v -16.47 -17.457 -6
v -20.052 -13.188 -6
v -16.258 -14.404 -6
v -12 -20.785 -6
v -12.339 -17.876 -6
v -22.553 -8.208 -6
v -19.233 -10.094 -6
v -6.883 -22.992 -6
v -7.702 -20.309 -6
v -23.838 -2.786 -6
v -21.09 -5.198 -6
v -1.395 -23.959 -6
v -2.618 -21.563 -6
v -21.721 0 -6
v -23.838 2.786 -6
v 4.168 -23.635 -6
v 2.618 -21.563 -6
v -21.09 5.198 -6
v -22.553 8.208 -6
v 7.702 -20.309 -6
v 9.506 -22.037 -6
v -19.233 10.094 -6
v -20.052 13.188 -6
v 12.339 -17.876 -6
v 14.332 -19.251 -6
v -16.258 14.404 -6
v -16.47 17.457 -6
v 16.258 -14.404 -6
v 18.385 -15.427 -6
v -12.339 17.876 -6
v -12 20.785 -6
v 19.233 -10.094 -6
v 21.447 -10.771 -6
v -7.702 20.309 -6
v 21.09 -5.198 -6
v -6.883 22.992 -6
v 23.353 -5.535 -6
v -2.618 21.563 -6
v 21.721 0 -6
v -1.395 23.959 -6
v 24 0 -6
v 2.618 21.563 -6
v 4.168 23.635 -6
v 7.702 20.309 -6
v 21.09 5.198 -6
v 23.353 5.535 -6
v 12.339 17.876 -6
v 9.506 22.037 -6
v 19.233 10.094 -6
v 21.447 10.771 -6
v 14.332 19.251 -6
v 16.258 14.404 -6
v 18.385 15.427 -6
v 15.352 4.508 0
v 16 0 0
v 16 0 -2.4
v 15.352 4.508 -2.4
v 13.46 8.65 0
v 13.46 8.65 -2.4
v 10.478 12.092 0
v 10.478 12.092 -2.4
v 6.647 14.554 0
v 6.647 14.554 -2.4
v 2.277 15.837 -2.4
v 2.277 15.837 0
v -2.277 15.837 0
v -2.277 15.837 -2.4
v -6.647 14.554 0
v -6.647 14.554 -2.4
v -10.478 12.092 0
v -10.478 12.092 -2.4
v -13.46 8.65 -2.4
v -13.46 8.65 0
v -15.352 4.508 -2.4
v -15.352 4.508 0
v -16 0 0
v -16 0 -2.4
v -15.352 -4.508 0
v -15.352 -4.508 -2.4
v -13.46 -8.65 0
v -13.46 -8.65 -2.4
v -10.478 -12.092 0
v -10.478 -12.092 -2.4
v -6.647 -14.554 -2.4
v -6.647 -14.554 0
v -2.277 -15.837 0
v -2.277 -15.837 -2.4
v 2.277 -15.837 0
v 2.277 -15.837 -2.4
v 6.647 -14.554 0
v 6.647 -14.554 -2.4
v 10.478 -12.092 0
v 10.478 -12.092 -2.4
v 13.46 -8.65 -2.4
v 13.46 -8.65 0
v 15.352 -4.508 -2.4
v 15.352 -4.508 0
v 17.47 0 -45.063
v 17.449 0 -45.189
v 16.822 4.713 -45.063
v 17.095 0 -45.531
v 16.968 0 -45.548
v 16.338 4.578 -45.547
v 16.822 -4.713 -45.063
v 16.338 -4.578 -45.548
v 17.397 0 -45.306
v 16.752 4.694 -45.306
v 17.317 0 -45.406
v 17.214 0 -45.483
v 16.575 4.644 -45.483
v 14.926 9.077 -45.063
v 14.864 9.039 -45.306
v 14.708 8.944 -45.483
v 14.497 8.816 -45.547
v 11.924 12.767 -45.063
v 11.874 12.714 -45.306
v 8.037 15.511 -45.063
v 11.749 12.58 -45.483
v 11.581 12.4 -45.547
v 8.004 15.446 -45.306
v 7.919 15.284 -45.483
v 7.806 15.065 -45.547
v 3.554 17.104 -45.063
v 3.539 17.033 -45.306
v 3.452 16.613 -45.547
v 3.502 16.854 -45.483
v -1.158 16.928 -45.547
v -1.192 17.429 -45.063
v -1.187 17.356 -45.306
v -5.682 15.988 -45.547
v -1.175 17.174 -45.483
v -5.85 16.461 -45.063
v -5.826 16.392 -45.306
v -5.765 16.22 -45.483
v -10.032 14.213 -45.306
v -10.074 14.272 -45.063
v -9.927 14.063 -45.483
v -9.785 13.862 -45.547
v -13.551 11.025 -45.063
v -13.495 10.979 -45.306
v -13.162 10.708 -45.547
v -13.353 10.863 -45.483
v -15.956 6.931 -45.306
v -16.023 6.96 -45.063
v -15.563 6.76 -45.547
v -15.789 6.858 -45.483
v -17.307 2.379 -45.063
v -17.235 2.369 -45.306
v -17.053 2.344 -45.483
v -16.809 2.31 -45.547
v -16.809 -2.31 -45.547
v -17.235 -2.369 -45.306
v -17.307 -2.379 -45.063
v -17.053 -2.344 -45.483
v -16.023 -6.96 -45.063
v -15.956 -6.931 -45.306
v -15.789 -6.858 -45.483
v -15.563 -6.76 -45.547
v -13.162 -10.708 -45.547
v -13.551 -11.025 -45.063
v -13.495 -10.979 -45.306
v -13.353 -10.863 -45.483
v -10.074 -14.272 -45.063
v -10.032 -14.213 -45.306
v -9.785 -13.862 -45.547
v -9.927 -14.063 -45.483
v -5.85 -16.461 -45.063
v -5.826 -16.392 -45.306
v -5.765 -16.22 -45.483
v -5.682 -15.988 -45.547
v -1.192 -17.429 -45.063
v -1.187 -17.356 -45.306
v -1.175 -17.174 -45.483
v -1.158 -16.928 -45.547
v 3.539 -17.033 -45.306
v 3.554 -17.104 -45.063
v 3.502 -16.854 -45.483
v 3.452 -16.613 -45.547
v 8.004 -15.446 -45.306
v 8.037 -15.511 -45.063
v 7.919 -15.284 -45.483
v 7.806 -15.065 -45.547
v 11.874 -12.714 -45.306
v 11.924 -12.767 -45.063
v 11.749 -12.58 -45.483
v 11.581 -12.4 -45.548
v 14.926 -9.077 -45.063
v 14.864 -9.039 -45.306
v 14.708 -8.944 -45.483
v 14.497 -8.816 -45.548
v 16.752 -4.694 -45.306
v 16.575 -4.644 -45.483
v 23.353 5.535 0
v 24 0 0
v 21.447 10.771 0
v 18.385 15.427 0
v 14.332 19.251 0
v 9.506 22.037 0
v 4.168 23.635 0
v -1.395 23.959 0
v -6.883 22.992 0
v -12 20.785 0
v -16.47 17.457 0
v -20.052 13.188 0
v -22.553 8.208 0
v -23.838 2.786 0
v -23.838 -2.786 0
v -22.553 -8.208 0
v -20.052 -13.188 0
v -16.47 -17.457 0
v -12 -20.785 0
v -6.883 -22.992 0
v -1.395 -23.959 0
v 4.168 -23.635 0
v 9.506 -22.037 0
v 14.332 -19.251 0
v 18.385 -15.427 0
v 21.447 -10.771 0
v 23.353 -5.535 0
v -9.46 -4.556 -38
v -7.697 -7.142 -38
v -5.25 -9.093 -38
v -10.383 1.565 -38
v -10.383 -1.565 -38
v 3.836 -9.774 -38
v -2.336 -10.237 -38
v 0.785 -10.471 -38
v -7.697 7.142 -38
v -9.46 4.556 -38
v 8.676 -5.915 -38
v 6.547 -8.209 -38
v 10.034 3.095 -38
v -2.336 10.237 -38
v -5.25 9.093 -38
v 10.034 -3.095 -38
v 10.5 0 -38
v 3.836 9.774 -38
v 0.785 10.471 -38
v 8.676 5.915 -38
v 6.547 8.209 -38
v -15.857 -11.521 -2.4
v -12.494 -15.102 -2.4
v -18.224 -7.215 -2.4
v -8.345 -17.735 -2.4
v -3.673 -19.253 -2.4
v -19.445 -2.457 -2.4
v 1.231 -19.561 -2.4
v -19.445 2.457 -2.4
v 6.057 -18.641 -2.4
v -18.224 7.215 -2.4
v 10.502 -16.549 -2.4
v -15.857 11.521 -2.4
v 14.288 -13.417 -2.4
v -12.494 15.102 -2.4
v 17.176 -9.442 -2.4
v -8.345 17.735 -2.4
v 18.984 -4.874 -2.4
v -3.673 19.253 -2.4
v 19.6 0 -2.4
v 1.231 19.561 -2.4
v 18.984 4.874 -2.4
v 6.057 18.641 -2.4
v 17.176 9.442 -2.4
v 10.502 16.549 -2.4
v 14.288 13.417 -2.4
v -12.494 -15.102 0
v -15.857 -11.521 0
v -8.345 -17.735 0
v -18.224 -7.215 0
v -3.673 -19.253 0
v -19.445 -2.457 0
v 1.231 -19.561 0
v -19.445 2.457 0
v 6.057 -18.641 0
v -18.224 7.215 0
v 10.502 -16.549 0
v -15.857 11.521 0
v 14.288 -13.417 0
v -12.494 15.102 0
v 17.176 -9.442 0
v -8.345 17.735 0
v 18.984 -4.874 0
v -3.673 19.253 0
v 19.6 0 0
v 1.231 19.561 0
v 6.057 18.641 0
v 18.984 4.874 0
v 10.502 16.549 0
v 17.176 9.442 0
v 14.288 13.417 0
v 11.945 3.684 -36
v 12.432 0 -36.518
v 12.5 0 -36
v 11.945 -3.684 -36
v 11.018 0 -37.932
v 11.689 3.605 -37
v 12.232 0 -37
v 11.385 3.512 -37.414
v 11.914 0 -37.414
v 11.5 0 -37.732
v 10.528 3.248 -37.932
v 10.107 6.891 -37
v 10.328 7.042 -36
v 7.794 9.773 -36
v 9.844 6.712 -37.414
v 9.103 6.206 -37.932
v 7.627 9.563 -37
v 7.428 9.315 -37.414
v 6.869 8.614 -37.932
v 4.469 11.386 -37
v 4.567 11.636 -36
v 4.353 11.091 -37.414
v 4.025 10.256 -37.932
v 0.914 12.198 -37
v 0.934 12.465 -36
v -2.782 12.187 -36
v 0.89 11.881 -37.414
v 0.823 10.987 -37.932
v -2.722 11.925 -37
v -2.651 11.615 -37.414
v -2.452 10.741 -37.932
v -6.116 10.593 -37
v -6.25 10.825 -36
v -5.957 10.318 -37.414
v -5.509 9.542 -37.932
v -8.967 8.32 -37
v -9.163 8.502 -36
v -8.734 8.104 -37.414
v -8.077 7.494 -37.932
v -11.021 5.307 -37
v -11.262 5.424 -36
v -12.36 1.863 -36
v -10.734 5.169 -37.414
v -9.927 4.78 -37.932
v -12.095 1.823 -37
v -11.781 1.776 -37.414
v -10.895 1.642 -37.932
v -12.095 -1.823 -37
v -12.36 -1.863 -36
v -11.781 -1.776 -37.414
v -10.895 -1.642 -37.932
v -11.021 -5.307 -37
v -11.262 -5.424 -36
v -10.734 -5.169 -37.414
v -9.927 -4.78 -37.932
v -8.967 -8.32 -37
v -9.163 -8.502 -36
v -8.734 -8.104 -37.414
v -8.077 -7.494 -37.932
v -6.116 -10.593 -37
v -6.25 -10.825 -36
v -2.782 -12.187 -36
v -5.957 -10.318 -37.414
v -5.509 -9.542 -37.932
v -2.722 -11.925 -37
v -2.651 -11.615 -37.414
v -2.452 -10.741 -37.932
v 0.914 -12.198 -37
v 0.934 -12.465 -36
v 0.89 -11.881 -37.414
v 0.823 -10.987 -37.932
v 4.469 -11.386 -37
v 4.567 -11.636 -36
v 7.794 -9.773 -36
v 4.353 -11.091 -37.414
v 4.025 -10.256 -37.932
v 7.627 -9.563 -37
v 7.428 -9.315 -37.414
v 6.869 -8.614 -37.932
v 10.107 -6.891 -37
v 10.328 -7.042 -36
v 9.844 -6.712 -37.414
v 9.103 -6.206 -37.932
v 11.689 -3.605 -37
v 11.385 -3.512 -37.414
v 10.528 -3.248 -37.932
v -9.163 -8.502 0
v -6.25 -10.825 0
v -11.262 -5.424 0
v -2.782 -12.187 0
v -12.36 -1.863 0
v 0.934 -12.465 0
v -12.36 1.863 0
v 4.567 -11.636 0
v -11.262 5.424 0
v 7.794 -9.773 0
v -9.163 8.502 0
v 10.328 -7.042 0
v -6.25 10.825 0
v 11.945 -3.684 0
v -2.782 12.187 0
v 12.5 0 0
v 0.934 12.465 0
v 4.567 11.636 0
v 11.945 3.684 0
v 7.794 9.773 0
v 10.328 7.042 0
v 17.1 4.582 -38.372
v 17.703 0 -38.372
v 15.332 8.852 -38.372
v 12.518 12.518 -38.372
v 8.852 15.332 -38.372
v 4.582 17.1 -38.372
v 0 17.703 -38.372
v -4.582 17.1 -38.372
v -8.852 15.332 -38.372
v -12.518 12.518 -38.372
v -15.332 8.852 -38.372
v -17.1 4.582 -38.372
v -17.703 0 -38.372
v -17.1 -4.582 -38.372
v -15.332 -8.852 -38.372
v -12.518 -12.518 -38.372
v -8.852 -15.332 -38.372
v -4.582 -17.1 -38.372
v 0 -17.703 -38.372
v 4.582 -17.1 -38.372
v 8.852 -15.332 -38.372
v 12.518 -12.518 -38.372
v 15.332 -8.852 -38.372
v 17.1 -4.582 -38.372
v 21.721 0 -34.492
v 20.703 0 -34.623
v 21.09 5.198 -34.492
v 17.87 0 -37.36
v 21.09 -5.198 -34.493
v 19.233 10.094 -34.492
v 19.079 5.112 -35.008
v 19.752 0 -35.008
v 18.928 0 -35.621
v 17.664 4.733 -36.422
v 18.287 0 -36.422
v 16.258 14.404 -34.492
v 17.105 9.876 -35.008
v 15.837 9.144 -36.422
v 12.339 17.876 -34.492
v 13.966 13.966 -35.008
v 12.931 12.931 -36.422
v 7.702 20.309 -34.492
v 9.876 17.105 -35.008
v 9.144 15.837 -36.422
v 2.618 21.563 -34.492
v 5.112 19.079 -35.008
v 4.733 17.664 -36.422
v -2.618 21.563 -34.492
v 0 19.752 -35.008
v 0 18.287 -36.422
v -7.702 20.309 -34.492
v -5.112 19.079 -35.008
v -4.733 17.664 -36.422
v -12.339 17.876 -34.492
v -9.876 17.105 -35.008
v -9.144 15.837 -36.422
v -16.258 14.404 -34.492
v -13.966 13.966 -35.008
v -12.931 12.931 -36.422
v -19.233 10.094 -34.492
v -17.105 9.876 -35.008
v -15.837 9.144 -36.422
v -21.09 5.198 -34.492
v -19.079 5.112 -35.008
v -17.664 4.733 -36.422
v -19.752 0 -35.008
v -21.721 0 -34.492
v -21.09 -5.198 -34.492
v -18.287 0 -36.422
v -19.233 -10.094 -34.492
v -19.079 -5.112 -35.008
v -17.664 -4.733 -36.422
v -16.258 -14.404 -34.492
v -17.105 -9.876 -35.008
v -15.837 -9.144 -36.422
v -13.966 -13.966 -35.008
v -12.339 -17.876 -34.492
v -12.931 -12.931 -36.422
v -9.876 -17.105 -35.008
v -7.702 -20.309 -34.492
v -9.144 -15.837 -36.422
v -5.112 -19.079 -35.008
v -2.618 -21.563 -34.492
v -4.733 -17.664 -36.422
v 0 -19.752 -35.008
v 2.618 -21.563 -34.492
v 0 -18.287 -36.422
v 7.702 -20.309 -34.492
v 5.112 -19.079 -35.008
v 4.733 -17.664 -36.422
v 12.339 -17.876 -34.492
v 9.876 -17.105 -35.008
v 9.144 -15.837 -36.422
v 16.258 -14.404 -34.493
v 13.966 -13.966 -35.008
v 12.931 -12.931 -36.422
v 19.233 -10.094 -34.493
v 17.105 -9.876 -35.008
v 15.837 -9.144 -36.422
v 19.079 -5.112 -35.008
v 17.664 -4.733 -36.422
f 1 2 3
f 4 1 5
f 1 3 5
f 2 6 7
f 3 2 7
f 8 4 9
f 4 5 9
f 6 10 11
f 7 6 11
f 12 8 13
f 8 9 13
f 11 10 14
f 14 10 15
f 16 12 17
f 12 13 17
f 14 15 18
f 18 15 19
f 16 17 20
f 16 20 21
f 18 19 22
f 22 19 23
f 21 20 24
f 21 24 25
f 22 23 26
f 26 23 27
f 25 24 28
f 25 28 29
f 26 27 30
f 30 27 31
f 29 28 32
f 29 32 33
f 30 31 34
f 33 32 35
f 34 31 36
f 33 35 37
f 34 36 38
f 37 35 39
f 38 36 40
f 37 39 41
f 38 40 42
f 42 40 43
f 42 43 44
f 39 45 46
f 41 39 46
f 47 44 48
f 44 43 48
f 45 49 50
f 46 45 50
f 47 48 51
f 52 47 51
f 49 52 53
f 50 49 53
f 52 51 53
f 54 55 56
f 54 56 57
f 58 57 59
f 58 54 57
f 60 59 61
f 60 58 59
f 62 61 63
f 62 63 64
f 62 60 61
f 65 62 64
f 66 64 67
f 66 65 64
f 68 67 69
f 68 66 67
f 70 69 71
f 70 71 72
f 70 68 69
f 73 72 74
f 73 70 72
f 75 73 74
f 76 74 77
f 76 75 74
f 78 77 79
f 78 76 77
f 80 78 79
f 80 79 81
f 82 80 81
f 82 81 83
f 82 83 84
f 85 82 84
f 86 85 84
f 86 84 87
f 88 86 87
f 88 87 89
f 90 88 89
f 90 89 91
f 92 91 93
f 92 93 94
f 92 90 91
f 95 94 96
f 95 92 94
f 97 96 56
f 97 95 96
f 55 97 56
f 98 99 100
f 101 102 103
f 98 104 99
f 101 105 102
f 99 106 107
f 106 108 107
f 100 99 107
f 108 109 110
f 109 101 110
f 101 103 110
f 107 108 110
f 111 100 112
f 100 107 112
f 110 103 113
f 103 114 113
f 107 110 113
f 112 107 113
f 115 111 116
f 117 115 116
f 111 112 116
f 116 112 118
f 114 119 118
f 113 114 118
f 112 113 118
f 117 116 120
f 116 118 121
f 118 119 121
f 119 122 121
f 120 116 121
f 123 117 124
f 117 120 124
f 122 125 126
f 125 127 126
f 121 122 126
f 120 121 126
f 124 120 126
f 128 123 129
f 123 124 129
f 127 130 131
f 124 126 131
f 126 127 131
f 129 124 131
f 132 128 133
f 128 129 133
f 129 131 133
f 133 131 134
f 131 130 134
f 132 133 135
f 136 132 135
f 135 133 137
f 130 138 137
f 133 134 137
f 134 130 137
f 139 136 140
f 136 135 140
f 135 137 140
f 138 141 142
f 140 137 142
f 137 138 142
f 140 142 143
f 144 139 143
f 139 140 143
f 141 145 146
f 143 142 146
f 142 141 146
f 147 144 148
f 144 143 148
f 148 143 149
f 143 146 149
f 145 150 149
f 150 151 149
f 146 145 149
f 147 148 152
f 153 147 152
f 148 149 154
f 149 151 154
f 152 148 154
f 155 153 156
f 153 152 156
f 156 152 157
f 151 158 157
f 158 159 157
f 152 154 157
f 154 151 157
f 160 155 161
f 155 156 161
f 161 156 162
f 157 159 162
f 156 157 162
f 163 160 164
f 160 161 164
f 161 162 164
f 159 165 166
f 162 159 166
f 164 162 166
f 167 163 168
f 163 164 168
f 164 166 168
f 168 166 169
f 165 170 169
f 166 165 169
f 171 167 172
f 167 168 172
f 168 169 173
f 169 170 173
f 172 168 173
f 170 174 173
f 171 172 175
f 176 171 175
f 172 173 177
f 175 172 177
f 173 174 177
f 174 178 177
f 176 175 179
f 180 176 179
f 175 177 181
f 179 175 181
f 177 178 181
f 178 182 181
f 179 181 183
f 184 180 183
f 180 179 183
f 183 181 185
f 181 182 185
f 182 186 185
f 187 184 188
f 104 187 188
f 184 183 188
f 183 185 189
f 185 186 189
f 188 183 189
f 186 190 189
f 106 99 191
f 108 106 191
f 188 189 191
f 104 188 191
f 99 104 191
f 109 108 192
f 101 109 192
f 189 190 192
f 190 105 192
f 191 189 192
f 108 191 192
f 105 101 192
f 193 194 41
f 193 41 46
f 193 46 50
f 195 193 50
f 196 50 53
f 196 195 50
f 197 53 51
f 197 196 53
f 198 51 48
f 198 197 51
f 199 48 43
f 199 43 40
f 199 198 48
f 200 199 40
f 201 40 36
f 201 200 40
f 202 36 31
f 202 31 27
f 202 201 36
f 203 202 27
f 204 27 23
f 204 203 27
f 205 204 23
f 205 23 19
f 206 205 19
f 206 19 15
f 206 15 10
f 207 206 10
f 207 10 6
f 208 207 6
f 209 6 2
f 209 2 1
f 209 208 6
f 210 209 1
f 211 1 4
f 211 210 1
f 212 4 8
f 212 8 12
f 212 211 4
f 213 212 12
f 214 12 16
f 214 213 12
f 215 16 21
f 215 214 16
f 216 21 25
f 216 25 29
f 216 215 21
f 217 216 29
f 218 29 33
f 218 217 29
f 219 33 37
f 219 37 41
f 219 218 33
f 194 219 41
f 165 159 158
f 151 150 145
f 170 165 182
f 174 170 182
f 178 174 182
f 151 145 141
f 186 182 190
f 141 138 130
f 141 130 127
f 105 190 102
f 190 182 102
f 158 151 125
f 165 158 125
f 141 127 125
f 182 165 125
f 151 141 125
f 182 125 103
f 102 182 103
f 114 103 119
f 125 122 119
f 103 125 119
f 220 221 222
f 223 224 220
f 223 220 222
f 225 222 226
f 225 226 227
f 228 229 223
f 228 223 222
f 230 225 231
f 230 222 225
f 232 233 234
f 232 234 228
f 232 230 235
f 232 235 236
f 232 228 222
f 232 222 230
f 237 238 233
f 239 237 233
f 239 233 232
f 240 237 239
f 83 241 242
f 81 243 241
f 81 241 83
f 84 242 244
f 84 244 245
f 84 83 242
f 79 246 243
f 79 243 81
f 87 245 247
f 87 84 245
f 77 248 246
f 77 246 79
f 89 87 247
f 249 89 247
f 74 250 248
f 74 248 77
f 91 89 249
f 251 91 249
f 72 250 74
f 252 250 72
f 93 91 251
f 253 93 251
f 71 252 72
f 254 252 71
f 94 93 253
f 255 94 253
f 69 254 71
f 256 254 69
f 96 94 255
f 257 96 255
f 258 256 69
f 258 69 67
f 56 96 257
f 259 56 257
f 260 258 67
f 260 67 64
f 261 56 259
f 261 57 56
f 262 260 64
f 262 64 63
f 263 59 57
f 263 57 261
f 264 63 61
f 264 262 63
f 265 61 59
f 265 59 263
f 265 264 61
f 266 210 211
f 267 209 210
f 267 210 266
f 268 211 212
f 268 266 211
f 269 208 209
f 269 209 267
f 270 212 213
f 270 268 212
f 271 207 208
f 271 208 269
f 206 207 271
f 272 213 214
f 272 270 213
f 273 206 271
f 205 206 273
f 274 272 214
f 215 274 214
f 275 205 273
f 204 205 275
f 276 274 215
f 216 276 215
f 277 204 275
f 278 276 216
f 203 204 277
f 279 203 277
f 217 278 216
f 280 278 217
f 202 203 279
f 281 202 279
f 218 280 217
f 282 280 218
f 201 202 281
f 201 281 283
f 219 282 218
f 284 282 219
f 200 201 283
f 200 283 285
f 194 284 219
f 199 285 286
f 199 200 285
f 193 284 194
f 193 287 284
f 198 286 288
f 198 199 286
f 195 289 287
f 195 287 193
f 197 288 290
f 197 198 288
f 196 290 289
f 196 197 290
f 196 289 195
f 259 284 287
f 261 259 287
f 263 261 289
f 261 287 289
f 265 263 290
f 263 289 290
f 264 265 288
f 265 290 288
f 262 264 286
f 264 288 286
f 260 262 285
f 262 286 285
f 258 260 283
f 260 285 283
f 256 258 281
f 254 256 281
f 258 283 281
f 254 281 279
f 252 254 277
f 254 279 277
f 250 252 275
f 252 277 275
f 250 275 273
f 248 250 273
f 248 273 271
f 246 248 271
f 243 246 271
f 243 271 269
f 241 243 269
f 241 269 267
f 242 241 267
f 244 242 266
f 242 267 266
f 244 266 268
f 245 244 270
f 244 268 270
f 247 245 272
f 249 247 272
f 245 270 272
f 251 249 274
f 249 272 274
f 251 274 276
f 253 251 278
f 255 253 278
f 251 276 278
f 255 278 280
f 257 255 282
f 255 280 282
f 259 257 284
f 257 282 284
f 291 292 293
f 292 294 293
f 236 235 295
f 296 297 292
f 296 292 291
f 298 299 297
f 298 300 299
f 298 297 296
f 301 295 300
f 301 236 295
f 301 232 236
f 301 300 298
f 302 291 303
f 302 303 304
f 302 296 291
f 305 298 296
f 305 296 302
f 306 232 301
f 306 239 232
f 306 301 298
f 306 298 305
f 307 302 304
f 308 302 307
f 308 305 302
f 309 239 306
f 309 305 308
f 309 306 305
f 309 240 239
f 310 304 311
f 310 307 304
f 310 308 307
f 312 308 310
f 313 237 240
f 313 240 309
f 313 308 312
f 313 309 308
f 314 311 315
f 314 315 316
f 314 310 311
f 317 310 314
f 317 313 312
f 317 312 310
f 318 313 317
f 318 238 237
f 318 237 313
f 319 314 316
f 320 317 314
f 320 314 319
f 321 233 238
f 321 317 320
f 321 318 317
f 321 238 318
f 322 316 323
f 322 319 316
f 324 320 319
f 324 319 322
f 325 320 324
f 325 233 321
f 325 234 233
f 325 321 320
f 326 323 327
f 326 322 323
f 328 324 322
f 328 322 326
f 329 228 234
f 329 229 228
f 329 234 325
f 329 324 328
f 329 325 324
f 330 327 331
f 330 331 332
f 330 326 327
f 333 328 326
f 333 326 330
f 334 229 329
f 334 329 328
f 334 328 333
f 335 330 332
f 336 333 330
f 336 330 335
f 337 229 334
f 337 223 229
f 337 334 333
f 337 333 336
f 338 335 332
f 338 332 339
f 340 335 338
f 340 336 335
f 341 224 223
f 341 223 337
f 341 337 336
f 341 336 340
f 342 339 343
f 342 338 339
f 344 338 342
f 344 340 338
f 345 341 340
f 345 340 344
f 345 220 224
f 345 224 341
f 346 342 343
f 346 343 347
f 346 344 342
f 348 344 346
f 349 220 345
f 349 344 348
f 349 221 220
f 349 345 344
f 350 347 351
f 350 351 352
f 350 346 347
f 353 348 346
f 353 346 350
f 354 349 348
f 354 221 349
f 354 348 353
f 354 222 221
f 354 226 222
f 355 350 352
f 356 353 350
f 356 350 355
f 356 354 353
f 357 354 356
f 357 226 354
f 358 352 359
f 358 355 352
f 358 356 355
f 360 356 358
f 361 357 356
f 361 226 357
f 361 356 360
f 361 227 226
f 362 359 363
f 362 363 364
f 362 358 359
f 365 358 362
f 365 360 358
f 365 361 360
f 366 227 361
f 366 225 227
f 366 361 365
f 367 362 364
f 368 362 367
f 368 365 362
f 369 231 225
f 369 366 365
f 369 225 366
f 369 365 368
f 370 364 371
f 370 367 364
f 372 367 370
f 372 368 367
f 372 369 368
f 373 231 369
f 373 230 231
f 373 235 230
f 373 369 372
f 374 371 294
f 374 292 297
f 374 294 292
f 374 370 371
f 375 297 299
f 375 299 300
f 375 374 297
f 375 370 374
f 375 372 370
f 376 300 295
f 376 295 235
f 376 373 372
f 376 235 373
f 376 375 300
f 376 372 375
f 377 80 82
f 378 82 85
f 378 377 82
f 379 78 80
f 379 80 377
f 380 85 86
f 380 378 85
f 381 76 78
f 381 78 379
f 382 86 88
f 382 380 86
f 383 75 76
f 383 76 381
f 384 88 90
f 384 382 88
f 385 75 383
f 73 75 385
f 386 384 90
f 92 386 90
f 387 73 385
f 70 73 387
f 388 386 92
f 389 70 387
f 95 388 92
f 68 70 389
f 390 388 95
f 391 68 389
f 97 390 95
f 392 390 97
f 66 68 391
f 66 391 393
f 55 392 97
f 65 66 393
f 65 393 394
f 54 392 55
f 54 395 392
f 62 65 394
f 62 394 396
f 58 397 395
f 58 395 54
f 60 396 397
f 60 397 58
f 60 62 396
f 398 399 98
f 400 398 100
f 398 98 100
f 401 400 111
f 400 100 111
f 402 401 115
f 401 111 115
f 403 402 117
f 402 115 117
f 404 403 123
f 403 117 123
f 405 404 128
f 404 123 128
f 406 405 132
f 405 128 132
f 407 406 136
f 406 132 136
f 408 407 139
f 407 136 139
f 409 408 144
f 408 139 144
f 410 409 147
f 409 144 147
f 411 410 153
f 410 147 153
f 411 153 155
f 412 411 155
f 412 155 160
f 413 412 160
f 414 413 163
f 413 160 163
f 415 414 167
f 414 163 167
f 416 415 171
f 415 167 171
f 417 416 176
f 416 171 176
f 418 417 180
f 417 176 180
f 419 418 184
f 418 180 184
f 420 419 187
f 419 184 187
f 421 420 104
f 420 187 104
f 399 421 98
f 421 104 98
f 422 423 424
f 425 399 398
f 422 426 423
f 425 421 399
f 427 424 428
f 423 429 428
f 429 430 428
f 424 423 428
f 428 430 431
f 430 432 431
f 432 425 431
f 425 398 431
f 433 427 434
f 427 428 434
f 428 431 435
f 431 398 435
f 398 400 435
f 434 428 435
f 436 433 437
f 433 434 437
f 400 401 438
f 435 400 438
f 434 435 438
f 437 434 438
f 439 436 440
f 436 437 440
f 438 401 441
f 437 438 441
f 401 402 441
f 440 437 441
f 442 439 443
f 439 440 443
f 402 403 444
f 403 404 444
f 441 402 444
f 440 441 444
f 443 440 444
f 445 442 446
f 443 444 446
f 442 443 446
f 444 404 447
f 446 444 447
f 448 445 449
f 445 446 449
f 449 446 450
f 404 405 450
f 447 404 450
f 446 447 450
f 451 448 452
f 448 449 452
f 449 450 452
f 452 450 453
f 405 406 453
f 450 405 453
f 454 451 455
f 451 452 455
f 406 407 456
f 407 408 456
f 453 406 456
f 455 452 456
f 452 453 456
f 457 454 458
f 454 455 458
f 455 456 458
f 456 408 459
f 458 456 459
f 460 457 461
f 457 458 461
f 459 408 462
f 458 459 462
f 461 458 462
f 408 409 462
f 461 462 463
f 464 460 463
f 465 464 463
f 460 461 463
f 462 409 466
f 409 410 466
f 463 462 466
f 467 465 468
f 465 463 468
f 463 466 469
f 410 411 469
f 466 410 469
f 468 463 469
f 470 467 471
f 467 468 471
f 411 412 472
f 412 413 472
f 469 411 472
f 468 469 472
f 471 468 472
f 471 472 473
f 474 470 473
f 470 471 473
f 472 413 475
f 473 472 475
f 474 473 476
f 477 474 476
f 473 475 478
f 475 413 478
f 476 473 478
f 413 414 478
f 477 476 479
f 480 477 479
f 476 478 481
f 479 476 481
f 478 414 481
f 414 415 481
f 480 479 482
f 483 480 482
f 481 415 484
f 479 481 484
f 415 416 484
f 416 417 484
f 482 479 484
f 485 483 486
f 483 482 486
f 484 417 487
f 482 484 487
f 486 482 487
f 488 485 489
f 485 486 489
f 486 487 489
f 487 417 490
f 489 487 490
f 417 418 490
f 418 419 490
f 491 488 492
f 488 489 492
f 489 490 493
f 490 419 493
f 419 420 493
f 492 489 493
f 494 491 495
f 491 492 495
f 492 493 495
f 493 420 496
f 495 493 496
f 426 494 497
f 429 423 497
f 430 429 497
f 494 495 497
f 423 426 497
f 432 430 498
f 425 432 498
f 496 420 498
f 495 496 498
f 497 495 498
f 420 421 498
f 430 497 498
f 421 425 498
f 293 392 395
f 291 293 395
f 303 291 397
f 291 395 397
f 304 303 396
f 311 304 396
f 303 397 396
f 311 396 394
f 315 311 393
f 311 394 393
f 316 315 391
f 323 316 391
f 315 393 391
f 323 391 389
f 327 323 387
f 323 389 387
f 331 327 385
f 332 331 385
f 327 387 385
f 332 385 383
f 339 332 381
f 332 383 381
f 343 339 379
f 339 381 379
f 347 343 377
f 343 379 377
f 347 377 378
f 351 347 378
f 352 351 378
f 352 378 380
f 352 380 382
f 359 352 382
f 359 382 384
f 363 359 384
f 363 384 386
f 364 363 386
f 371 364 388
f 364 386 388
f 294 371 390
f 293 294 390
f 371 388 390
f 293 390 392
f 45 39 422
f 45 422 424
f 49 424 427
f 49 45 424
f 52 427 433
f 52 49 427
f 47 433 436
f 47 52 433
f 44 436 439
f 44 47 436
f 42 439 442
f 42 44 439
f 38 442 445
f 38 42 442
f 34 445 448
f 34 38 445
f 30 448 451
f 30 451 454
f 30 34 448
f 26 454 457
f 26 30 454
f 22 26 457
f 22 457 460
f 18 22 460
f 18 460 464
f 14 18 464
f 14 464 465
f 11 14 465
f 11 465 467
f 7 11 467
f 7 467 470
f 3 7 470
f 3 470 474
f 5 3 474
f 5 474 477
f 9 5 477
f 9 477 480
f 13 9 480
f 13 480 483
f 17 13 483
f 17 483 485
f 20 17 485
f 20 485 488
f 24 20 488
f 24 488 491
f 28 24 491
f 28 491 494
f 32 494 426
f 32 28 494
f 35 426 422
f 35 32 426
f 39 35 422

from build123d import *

# Parameters (mm, degrees)
SKETCH1_R      = 21.720880237
EXTRUDE1_DEPTH = 45.5475
SKETCH2_R      = 24
EXTRUDE2_DEPTH = 6
SKETCH3_R      = 12.5
EXTRUDE3_DEPTH = 38
SKETCH4_R      = 19.6
SKETCH4_R_2    = 16
EXTRUDE4_DEPTH = 2.4
FILLET1_R      = 2


# Read off the part's stored shape, not the designer's step: Cavity1
with BuildPart() as part:
    # Sketch1 → Extrude1 (new body)
    with BuildSketch(Plane.XY):
        Circle(SKETCH1_R)
    extrude(amount=-EXTRUDE1_DEPTH)

    # Cavity1 outline → Cavity1 (revolve, cut)
    with BuildSketch(Plane.XZ):
        with BuildLine():
            Line((21.720880237, -45.5475), (21.720880237, -34.4925))
            ThreePointArc((21.720880237, -34.4925), (18.928353588, -35.620754002), (17.703329112, -38.372204023))
            Line((17.703329112, -38.372204023), (17.469697537, -45.062536997))
            ThreePointArc((17.469697537, -45.062536997), (17.316569477, -45.406468249), (16.967503646, -45.5475))
            Line((16.967503646, -45.5475), (21.720880237, -45.5475))
        make_face()
    revolve(axis=Axis((0, 0, 0), (5.33833708127146e-12, -2.69575334284611e-12, 1.0)), mode=Mode.SUBTRACT)

    # Sketch2 → Extrude2 (add)
    with BuildSketch(Plane.XY):
        Circle(SKETCH2_R)
    extrude(amount=-EXTRUDE2_DEPTH)

    # Sketch3 → Extrude3 (cut)
    with BuildSketch(Plane.XY):
        Circle(SKETCH3_R)
    extrude(amount=-EXTRUDE3_DEPTH, mode=Mode.SUBTRACT)

    # Sketch4 → Extrude4 (cut)
    with BuildSketch(Plane.XY):
        Circle(SKETCH4_R)
        Circle(SKETCH4_R_2, mode=Mode.SUBTRACT)
    extrude(amount=-EXTRUDE4_DEPTH, mode=Mode.SUBTRACT)

    # Fillet1
    fillet1_edges = [part.edges().sort_by_distance(p)[0] for p in [
        (-12.5, 0, -38),
    ]]
    fillet(fillet1_edges, radius=FILLET1_R)


solid = part.part
